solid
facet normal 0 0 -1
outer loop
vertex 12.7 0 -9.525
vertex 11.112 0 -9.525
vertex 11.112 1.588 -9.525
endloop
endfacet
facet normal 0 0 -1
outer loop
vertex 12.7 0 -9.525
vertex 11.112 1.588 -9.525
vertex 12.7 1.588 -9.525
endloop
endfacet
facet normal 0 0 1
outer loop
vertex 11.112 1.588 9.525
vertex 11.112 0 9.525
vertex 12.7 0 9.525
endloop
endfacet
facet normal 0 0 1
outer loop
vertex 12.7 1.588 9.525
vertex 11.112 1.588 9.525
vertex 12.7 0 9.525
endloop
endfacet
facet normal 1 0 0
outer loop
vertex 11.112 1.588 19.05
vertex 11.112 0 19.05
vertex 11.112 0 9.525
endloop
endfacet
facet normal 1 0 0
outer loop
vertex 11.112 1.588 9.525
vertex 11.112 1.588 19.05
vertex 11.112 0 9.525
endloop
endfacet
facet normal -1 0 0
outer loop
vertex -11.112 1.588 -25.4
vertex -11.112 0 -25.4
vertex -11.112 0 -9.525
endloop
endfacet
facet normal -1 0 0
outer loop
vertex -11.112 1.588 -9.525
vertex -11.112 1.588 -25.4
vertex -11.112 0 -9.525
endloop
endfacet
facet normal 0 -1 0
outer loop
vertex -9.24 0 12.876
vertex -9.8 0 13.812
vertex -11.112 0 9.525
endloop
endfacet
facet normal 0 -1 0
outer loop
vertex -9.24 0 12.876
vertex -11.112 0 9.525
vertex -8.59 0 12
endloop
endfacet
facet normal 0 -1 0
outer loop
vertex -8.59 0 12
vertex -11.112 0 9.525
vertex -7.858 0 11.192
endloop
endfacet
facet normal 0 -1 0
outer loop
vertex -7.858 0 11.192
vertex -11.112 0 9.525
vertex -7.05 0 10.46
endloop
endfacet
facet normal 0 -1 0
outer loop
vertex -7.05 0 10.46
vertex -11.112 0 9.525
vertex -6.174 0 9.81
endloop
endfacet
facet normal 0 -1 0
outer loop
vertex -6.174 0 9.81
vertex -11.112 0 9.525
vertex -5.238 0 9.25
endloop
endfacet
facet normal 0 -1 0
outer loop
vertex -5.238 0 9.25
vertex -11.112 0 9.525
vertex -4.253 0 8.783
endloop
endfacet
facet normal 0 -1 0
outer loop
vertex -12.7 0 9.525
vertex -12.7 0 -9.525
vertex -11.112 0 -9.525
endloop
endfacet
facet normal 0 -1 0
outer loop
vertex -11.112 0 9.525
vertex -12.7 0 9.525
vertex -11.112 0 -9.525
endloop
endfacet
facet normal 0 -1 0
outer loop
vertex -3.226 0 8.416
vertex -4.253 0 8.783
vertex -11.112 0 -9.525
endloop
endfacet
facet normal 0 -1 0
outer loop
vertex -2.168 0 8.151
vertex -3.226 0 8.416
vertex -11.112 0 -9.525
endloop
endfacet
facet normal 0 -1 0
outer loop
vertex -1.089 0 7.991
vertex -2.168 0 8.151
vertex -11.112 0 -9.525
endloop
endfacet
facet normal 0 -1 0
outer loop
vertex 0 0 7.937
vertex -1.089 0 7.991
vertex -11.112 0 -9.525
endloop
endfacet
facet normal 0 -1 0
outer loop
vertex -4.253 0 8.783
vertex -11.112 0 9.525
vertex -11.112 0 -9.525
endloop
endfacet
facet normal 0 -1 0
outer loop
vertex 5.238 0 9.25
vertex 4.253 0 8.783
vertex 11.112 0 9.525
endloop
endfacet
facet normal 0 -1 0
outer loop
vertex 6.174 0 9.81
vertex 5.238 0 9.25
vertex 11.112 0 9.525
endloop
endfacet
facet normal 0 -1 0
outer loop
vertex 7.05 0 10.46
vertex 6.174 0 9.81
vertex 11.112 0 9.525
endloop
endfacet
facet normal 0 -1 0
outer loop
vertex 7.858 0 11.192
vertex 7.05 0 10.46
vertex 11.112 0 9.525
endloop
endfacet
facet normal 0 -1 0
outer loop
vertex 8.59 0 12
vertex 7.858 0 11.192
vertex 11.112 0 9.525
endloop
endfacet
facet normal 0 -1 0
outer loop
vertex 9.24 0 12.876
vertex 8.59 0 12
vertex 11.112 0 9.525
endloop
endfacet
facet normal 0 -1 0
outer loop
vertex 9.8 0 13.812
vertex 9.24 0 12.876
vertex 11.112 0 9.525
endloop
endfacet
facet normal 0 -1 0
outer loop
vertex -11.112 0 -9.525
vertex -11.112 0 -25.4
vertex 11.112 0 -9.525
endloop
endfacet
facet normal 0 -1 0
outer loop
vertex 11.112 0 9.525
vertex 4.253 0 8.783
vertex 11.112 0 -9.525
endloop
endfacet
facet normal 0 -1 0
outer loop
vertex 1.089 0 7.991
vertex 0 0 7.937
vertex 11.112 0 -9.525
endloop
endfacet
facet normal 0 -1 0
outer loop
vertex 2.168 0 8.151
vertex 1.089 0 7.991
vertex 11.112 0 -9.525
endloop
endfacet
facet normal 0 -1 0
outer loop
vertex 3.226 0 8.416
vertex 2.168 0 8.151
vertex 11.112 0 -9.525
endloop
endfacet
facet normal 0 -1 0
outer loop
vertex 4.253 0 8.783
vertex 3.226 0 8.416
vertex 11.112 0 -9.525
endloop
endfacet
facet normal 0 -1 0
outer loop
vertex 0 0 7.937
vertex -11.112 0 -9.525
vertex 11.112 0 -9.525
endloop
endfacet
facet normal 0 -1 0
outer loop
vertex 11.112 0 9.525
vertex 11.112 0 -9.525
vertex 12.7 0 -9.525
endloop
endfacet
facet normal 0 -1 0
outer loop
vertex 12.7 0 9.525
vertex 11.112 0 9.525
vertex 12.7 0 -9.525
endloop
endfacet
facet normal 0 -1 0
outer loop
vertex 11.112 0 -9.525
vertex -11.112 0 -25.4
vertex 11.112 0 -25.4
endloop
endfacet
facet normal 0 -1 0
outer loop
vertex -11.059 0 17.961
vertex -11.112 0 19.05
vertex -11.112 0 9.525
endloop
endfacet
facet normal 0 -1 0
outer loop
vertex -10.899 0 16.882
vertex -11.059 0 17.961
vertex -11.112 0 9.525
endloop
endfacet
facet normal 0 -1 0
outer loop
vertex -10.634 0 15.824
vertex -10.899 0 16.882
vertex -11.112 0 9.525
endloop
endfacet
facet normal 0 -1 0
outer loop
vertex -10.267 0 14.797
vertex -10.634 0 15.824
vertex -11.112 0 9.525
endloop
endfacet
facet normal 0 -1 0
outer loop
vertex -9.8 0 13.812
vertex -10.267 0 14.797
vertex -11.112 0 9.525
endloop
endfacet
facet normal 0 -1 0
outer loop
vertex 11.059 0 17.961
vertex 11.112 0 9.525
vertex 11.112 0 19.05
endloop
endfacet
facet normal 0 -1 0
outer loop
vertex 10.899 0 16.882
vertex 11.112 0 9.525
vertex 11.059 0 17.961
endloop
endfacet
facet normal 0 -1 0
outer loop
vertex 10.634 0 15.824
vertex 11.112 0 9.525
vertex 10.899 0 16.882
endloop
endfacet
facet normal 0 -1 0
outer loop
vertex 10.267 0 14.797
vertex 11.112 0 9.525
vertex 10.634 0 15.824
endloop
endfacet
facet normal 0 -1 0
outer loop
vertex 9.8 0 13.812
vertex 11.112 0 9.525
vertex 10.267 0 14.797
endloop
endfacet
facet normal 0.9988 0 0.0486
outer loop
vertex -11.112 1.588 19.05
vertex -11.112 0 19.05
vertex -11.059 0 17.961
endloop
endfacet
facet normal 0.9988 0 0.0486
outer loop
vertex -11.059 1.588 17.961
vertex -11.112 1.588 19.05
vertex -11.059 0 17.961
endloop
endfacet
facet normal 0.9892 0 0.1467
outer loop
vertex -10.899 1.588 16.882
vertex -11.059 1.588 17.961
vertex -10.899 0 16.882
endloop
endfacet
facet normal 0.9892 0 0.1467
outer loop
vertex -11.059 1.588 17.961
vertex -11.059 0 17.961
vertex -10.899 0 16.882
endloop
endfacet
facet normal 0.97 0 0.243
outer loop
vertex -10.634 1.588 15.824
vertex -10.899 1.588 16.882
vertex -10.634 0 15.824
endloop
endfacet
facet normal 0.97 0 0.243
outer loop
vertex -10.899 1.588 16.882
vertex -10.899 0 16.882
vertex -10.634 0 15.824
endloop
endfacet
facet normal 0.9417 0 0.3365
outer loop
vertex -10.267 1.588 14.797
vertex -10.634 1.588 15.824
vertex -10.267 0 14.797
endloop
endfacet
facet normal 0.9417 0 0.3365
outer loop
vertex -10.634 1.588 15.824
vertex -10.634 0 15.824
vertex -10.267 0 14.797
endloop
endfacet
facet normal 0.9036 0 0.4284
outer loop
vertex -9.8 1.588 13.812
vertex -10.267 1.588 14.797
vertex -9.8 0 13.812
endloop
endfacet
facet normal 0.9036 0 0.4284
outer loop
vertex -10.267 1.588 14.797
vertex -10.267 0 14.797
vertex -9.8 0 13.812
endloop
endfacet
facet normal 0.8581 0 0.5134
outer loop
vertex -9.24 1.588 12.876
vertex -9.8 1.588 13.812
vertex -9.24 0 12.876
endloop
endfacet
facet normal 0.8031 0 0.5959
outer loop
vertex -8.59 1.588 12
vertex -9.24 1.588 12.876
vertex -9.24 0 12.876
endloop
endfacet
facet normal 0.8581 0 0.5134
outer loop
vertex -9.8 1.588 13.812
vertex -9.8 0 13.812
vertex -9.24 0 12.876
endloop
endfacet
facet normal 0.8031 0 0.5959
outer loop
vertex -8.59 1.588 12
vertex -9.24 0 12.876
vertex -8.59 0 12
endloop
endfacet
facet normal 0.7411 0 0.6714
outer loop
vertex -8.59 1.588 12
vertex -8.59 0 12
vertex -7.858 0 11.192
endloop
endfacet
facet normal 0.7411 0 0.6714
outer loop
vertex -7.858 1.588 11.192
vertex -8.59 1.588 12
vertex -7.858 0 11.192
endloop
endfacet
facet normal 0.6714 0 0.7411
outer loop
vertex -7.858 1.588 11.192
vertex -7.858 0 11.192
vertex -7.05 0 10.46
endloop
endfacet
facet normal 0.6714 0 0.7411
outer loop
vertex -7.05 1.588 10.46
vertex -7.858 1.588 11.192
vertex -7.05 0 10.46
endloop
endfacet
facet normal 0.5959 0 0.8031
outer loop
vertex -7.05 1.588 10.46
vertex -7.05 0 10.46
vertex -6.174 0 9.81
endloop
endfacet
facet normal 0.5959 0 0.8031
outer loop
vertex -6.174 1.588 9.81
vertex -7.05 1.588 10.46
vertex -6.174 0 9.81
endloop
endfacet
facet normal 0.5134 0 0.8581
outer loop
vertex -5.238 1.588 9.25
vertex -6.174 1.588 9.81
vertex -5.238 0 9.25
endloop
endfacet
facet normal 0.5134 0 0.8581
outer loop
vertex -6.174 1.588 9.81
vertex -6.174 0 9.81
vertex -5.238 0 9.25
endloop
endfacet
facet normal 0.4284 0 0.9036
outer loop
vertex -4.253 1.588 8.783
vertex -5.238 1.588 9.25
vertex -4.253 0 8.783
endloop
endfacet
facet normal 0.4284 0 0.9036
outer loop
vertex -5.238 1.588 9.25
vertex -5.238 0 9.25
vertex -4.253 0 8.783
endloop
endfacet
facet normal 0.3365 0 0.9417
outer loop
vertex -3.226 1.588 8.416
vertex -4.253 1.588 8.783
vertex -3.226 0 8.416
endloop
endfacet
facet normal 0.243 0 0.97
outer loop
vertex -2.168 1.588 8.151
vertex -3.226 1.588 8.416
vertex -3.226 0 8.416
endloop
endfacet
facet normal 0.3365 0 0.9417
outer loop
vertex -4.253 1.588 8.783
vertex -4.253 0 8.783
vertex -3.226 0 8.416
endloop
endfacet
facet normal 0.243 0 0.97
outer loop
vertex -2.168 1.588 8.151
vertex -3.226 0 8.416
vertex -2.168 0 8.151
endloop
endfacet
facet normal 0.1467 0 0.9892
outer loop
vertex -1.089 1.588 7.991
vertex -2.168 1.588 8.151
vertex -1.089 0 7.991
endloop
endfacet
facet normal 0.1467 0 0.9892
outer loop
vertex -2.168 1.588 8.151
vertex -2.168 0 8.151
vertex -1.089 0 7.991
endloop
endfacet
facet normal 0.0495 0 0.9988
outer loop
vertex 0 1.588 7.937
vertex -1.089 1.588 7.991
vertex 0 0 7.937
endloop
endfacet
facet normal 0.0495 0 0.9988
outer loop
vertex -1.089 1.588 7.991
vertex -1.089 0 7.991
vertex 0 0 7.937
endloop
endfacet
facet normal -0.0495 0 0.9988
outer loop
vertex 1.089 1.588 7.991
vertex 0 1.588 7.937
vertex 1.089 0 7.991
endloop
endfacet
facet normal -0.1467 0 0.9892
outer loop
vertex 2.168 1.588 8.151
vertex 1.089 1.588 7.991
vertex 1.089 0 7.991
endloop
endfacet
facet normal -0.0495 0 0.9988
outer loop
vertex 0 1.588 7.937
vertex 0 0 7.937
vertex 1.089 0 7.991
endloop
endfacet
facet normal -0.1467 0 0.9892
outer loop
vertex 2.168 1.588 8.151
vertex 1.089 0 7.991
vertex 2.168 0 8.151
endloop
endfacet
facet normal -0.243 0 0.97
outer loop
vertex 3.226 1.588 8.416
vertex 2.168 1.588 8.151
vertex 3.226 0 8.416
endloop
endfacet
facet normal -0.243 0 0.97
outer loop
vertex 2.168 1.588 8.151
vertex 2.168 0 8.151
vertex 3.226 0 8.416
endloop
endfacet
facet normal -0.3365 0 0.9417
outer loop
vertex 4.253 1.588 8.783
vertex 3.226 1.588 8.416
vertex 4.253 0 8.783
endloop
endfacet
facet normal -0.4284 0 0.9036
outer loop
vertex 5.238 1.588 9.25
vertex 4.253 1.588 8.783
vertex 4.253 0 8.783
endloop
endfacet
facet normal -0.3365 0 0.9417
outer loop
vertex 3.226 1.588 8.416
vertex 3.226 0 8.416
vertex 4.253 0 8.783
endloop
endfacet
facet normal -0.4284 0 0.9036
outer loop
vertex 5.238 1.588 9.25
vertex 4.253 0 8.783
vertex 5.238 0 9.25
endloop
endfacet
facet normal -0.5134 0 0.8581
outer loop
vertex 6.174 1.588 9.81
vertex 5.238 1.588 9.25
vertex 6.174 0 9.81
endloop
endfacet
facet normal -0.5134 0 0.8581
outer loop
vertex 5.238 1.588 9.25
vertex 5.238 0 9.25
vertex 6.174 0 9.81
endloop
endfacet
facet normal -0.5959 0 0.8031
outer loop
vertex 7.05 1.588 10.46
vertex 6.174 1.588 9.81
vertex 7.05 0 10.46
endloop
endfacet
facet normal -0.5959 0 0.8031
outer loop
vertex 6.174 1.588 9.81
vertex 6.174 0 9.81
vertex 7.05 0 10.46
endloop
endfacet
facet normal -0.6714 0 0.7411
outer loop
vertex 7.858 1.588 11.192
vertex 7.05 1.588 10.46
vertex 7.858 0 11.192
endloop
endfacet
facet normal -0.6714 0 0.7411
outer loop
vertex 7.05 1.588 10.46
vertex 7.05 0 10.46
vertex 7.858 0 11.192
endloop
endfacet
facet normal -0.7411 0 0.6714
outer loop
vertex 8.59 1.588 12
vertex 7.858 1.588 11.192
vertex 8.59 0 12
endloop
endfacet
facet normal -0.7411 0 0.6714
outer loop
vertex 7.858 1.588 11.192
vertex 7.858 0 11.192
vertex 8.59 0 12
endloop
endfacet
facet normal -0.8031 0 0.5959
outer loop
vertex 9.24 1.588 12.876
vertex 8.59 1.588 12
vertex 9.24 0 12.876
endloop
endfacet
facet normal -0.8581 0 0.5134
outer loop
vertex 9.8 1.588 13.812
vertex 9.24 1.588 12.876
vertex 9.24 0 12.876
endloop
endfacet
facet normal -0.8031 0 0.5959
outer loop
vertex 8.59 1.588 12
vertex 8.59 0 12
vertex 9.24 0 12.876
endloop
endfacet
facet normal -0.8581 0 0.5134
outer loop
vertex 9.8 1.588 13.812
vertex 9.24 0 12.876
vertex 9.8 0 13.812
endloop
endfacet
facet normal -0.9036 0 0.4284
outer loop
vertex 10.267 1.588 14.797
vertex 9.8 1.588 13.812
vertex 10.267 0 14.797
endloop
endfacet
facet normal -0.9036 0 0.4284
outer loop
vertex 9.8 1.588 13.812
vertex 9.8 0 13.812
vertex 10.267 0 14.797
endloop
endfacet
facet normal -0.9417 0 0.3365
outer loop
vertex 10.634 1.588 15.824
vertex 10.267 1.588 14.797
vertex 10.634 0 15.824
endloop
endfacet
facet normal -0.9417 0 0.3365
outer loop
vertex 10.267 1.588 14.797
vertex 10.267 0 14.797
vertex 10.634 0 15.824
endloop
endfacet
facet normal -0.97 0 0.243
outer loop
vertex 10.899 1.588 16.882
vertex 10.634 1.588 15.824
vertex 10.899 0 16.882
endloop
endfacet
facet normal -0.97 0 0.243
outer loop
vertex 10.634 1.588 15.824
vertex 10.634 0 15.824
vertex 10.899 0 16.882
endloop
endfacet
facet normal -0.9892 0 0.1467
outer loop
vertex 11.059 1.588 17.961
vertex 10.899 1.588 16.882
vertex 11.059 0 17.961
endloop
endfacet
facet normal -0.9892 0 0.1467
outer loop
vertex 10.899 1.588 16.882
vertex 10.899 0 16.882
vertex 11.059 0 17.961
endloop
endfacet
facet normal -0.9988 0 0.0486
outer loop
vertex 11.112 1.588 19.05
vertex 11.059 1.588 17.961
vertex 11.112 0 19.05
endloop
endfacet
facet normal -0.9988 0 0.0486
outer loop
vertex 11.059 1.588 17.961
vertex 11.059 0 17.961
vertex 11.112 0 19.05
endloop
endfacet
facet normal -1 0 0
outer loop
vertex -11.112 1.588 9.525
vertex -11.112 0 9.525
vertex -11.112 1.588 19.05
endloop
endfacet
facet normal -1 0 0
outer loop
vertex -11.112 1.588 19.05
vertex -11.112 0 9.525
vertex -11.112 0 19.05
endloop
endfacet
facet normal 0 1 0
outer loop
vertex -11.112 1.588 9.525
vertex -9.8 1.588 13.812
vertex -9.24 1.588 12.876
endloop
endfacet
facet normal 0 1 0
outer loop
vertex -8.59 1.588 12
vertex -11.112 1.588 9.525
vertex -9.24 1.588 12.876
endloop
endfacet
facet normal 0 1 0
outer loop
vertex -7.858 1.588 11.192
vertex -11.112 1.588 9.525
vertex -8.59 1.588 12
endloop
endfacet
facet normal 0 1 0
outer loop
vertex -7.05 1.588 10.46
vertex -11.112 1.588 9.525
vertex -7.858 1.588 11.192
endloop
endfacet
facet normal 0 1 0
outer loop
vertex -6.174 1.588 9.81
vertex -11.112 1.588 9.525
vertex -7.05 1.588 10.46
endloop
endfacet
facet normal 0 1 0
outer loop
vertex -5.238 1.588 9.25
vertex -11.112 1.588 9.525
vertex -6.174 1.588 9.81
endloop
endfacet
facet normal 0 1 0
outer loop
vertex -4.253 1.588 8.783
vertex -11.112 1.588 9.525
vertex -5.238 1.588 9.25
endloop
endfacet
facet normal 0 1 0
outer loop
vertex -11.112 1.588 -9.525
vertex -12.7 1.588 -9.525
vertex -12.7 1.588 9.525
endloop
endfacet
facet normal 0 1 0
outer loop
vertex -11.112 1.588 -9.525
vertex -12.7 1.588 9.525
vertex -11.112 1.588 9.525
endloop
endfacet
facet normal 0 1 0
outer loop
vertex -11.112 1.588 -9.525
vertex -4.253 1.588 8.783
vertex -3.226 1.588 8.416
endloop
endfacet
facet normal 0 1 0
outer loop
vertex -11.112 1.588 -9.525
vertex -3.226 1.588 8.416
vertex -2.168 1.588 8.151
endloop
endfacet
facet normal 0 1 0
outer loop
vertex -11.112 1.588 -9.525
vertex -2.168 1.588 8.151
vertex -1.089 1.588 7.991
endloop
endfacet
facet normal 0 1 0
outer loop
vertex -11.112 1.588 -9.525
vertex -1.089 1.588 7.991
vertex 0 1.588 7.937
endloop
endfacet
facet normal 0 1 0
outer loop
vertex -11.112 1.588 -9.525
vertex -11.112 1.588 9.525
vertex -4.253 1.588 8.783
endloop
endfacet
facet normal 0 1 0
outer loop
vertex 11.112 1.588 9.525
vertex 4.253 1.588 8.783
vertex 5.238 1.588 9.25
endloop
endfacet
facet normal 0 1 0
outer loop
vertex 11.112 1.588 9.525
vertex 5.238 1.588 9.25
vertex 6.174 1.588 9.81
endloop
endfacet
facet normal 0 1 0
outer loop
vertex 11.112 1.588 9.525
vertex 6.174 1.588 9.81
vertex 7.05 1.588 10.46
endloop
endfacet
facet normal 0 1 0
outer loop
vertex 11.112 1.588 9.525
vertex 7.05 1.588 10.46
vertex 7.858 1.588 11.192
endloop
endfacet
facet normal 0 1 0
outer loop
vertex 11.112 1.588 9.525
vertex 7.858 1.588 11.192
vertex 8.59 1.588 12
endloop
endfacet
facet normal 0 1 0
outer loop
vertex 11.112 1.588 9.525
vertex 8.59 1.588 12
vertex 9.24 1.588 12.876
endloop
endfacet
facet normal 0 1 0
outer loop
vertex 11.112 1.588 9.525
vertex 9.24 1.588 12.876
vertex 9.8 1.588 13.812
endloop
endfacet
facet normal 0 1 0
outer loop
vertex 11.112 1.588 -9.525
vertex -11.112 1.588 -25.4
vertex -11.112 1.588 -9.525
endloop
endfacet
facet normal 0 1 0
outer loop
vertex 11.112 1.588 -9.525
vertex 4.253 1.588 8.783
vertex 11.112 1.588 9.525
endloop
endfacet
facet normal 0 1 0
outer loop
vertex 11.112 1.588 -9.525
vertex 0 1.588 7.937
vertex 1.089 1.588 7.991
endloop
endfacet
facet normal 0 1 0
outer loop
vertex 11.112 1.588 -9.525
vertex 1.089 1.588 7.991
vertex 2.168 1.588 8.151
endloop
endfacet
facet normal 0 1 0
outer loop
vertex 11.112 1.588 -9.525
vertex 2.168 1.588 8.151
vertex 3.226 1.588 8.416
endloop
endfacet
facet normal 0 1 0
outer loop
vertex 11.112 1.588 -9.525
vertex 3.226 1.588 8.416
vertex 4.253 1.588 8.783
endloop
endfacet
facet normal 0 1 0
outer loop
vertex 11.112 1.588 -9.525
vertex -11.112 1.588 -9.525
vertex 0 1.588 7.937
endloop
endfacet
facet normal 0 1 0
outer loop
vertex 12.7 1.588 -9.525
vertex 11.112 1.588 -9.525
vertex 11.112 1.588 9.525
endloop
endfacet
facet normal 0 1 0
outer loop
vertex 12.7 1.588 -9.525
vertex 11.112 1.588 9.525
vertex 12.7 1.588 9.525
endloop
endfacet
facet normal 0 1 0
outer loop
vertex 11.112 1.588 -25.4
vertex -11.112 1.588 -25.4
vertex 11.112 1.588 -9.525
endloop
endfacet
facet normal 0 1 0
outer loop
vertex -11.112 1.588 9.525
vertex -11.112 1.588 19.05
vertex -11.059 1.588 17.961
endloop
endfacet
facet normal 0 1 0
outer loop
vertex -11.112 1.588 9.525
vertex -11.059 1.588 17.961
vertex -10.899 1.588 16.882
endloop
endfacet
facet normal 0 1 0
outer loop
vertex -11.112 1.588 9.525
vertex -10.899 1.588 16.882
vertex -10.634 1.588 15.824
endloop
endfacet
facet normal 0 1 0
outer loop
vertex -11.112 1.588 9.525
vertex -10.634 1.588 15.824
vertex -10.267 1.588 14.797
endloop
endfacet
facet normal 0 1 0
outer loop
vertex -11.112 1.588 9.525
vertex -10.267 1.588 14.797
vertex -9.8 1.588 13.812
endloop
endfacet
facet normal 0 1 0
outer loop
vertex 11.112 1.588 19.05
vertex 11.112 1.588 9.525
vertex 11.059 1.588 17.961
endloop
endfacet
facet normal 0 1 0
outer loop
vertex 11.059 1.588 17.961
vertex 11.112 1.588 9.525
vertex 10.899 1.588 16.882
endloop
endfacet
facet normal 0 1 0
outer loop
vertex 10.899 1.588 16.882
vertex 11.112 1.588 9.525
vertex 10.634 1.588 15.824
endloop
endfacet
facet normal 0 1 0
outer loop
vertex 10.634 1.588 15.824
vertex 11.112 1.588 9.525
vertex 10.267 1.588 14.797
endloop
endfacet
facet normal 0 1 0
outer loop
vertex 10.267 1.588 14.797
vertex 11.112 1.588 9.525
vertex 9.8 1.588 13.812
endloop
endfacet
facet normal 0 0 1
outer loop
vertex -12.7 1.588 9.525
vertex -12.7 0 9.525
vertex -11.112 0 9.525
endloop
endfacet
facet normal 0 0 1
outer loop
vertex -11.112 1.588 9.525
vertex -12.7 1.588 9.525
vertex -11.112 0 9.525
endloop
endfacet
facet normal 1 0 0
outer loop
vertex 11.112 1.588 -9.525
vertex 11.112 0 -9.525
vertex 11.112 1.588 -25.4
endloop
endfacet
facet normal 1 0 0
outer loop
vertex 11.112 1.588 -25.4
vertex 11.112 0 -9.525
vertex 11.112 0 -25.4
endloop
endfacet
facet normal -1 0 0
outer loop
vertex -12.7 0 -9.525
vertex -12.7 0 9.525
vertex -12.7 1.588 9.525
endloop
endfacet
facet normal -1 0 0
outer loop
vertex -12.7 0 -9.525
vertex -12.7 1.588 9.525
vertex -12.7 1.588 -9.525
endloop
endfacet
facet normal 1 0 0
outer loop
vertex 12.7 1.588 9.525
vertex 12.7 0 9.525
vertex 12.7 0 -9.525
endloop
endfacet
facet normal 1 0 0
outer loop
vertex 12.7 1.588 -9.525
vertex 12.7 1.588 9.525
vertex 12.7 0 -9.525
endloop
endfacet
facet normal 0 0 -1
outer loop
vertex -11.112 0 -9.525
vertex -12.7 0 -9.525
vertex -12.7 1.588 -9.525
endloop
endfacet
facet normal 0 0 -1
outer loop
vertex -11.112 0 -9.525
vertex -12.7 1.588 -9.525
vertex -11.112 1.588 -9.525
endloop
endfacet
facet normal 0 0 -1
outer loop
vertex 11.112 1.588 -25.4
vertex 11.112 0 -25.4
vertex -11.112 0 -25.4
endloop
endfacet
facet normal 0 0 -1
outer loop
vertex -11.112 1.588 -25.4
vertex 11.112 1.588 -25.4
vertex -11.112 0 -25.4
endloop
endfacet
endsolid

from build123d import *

# Parameters (mm, degrees)
SKETCH1_W           = 1.5875
SKETCH1_H           = 19.05
BOSS_EXTRUDE1_DEPTH = 1.5875


with BuildPart() as part:
    # Sketch1 → Boss-Extrude1 (new body)
    with BuildSketch(Plane(origin=(0, 0, 0), x_dir=(1, 0, 0), z_dir=(0, 1, 0))):
        with BuildLine():
            Line((11.1125, 9.525), (11.1125, 25.4))
            Line((11.1125, 25.4), (-11.1125, 25.4))
            Line((-11.1125, 25.4), (-11.1125, 9.525))
            Line((-11.1125, 9.525), (-11.1125, -9.525))
            Line((-11.1125, -9.525), (-11.1125, -19.05))
            ThreePointArc((-11.1125, -19.05), (0, -7.9375), (11.1125, -19.05))
            Line((11.1125, -19.05), (11.1125, -9.525))
            Line((11.1125, -9.525), (11.1125, 9.525))
        make_face()
        with Locations((11.90625, 0)):
            Rectangle(SKETCH1_W, SKETCH1_H)
        with Locations((-11.90625, 0)):
            Rectangle(SKETCH1_W, SKETCH1_H)
    extrude(amount=BOSS_EXTRUDE1_DEPTH)


solid = part.part
